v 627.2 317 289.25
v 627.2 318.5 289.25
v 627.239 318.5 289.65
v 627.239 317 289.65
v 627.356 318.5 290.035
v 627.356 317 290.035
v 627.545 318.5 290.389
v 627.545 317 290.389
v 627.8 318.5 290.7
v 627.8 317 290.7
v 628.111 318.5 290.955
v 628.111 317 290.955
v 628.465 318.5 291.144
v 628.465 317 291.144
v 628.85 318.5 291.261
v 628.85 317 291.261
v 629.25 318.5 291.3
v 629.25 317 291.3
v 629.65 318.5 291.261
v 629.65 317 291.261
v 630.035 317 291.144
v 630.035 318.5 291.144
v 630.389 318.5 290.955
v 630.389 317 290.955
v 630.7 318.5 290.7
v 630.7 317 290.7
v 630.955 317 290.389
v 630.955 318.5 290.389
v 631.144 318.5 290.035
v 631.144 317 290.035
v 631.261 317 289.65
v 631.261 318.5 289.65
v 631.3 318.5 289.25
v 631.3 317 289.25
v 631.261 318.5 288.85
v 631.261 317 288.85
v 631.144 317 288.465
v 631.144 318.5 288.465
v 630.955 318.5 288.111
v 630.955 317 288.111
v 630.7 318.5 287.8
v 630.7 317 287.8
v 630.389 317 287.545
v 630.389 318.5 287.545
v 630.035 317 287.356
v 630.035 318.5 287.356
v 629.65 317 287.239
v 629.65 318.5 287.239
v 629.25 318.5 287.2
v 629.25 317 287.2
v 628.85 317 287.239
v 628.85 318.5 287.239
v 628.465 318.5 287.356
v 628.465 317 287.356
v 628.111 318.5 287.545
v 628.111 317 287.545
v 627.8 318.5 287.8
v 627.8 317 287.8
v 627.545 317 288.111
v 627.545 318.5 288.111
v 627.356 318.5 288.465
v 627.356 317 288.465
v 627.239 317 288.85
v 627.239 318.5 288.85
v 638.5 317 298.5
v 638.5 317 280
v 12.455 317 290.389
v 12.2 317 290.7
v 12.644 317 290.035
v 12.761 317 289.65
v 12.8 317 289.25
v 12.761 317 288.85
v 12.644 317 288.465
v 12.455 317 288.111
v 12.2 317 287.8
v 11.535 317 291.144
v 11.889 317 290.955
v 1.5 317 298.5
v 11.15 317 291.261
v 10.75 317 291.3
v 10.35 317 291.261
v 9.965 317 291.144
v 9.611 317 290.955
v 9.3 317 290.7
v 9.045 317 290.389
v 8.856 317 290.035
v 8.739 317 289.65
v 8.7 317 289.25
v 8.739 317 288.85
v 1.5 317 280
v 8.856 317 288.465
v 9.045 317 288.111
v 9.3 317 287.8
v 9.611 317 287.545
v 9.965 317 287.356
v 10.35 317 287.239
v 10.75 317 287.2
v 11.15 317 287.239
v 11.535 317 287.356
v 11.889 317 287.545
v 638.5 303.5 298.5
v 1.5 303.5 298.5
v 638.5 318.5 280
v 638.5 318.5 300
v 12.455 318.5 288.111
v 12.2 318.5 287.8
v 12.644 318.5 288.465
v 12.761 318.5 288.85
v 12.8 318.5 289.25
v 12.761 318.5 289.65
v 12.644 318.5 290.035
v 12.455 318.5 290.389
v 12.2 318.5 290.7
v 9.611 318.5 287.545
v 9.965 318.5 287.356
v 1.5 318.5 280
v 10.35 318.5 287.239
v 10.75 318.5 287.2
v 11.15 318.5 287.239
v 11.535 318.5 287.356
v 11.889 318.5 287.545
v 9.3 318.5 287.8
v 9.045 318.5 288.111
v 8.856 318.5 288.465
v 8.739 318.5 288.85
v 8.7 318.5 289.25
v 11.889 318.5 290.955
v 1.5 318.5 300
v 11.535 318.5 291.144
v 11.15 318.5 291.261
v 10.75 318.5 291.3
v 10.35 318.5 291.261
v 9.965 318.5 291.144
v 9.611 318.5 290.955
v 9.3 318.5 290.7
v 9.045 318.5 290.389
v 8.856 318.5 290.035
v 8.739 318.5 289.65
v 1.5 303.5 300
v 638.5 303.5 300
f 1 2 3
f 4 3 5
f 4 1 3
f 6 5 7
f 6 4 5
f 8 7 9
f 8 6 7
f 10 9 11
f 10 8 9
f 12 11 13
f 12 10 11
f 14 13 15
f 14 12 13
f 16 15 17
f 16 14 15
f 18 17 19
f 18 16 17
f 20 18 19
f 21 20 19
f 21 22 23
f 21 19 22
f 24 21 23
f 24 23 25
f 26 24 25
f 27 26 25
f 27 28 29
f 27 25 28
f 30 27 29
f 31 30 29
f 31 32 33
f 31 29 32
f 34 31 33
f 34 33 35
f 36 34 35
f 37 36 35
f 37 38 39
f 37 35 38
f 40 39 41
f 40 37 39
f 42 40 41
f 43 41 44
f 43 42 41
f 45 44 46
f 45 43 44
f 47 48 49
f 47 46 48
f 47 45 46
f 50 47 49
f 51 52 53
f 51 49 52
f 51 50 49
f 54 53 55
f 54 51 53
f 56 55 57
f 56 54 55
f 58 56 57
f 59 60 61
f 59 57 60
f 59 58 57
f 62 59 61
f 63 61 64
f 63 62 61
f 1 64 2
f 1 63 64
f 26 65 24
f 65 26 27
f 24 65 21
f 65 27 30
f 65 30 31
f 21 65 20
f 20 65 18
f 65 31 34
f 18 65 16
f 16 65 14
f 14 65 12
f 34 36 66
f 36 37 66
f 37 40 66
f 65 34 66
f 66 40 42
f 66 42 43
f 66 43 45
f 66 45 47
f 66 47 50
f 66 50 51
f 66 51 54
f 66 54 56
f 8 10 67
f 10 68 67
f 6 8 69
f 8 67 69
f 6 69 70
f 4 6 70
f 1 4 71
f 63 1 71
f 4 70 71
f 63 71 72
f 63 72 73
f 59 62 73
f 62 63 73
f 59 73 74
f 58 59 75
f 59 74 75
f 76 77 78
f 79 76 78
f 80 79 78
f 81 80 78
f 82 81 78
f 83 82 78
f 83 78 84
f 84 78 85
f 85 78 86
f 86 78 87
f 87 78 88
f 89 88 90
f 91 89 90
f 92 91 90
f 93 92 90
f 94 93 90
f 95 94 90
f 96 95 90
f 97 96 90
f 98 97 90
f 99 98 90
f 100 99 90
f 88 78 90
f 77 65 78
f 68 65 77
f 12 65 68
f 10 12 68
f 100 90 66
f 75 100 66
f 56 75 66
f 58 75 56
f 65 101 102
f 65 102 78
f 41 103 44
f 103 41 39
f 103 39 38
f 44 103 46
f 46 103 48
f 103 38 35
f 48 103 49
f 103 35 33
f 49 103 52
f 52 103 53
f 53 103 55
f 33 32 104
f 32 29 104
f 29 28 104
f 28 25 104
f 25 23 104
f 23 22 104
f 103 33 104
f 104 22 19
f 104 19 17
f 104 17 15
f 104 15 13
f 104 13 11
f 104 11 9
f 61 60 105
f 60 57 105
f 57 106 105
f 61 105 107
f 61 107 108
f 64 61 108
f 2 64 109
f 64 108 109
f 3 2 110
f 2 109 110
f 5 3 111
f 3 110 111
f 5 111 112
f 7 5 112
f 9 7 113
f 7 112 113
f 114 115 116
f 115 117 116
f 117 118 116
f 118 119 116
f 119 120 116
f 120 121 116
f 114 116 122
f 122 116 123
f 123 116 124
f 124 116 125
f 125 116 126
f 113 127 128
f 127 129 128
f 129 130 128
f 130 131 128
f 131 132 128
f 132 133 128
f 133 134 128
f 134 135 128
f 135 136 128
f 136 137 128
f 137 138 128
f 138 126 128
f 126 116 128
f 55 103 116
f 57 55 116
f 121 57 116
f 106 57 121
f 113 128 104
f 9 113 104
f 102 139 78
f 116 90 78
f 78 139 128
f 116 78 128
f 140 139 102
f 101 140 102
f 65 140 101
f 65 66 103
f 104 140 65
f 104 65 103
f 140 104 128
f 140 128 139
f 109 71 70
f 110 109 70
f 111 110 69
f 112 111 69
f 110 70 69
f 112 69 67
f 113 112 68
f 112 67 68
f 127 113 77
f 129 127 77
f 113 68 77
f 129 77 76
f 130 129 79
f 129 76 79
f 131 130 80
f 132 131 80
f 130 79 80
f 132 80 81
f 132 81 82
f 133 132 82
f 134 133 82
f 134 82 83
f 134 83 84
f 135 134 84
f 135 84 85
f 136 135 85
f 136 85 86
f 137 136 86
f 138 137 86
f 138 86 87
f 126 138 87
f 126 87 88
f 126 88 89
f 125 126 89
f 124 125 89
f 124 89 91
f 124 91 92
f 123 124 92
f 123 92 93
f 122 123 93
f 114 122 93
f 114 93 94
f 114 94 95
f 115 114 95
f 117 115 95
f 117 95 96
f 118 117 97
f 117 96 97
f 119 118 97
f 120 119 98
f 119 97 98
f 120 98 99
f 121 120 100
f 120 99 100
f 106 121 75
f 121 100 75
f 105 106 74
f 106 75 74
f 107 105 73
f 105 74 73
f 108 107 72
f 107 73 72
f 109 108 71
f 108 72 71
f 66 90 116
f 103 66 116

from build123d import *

# Parameters (mm, degrees)
EXTRUDE002_DEPTH = 637
SKETCH016_R      = 2.05
HOLE009_DEPTH    = 1276.481784


with BuildPart() as part:
    # Sketch015 → Extrude002 (new body)
    with BuildSketch(Plane(origin=(0, 0, 0), x_dir=(0, -1, 0), z_dir=(-1, 0, 0))):
        Polygon((-15, 0), (-15, 20), (0, 20), (0, 18.5), (-13.5, 18.5), (-13.5, 0), align=None)
    extrude(amount=-EXTRUDE002_DEPTH)

    # Sketch016 → Hole009 (cut, through all)
    with BuildSketch(Plane.XZ.offset(-13.5)):
        with Locations((9.25, 9.25)):
            Circle(SKETCH016_R)
    hole009 = extrude(amount=-HOLE009_DEPTH, mode=Mode.SUBTRACT)

    # Mirrored005: Hole009 across Sketch016 Axis0
    add(hole009.mirror(Plane(origin=(318.5, 13.5, 18.5), x_dir=(0, -1, 0), z_dir=(1, 0, 0))), mode=Mode.SUBTRACT)


with BuildPart() as part_1:
    # Body007 placement: moved
    add(part.part.moved(Location((1.5, 303.5, 280))))


solid = part_1.part
